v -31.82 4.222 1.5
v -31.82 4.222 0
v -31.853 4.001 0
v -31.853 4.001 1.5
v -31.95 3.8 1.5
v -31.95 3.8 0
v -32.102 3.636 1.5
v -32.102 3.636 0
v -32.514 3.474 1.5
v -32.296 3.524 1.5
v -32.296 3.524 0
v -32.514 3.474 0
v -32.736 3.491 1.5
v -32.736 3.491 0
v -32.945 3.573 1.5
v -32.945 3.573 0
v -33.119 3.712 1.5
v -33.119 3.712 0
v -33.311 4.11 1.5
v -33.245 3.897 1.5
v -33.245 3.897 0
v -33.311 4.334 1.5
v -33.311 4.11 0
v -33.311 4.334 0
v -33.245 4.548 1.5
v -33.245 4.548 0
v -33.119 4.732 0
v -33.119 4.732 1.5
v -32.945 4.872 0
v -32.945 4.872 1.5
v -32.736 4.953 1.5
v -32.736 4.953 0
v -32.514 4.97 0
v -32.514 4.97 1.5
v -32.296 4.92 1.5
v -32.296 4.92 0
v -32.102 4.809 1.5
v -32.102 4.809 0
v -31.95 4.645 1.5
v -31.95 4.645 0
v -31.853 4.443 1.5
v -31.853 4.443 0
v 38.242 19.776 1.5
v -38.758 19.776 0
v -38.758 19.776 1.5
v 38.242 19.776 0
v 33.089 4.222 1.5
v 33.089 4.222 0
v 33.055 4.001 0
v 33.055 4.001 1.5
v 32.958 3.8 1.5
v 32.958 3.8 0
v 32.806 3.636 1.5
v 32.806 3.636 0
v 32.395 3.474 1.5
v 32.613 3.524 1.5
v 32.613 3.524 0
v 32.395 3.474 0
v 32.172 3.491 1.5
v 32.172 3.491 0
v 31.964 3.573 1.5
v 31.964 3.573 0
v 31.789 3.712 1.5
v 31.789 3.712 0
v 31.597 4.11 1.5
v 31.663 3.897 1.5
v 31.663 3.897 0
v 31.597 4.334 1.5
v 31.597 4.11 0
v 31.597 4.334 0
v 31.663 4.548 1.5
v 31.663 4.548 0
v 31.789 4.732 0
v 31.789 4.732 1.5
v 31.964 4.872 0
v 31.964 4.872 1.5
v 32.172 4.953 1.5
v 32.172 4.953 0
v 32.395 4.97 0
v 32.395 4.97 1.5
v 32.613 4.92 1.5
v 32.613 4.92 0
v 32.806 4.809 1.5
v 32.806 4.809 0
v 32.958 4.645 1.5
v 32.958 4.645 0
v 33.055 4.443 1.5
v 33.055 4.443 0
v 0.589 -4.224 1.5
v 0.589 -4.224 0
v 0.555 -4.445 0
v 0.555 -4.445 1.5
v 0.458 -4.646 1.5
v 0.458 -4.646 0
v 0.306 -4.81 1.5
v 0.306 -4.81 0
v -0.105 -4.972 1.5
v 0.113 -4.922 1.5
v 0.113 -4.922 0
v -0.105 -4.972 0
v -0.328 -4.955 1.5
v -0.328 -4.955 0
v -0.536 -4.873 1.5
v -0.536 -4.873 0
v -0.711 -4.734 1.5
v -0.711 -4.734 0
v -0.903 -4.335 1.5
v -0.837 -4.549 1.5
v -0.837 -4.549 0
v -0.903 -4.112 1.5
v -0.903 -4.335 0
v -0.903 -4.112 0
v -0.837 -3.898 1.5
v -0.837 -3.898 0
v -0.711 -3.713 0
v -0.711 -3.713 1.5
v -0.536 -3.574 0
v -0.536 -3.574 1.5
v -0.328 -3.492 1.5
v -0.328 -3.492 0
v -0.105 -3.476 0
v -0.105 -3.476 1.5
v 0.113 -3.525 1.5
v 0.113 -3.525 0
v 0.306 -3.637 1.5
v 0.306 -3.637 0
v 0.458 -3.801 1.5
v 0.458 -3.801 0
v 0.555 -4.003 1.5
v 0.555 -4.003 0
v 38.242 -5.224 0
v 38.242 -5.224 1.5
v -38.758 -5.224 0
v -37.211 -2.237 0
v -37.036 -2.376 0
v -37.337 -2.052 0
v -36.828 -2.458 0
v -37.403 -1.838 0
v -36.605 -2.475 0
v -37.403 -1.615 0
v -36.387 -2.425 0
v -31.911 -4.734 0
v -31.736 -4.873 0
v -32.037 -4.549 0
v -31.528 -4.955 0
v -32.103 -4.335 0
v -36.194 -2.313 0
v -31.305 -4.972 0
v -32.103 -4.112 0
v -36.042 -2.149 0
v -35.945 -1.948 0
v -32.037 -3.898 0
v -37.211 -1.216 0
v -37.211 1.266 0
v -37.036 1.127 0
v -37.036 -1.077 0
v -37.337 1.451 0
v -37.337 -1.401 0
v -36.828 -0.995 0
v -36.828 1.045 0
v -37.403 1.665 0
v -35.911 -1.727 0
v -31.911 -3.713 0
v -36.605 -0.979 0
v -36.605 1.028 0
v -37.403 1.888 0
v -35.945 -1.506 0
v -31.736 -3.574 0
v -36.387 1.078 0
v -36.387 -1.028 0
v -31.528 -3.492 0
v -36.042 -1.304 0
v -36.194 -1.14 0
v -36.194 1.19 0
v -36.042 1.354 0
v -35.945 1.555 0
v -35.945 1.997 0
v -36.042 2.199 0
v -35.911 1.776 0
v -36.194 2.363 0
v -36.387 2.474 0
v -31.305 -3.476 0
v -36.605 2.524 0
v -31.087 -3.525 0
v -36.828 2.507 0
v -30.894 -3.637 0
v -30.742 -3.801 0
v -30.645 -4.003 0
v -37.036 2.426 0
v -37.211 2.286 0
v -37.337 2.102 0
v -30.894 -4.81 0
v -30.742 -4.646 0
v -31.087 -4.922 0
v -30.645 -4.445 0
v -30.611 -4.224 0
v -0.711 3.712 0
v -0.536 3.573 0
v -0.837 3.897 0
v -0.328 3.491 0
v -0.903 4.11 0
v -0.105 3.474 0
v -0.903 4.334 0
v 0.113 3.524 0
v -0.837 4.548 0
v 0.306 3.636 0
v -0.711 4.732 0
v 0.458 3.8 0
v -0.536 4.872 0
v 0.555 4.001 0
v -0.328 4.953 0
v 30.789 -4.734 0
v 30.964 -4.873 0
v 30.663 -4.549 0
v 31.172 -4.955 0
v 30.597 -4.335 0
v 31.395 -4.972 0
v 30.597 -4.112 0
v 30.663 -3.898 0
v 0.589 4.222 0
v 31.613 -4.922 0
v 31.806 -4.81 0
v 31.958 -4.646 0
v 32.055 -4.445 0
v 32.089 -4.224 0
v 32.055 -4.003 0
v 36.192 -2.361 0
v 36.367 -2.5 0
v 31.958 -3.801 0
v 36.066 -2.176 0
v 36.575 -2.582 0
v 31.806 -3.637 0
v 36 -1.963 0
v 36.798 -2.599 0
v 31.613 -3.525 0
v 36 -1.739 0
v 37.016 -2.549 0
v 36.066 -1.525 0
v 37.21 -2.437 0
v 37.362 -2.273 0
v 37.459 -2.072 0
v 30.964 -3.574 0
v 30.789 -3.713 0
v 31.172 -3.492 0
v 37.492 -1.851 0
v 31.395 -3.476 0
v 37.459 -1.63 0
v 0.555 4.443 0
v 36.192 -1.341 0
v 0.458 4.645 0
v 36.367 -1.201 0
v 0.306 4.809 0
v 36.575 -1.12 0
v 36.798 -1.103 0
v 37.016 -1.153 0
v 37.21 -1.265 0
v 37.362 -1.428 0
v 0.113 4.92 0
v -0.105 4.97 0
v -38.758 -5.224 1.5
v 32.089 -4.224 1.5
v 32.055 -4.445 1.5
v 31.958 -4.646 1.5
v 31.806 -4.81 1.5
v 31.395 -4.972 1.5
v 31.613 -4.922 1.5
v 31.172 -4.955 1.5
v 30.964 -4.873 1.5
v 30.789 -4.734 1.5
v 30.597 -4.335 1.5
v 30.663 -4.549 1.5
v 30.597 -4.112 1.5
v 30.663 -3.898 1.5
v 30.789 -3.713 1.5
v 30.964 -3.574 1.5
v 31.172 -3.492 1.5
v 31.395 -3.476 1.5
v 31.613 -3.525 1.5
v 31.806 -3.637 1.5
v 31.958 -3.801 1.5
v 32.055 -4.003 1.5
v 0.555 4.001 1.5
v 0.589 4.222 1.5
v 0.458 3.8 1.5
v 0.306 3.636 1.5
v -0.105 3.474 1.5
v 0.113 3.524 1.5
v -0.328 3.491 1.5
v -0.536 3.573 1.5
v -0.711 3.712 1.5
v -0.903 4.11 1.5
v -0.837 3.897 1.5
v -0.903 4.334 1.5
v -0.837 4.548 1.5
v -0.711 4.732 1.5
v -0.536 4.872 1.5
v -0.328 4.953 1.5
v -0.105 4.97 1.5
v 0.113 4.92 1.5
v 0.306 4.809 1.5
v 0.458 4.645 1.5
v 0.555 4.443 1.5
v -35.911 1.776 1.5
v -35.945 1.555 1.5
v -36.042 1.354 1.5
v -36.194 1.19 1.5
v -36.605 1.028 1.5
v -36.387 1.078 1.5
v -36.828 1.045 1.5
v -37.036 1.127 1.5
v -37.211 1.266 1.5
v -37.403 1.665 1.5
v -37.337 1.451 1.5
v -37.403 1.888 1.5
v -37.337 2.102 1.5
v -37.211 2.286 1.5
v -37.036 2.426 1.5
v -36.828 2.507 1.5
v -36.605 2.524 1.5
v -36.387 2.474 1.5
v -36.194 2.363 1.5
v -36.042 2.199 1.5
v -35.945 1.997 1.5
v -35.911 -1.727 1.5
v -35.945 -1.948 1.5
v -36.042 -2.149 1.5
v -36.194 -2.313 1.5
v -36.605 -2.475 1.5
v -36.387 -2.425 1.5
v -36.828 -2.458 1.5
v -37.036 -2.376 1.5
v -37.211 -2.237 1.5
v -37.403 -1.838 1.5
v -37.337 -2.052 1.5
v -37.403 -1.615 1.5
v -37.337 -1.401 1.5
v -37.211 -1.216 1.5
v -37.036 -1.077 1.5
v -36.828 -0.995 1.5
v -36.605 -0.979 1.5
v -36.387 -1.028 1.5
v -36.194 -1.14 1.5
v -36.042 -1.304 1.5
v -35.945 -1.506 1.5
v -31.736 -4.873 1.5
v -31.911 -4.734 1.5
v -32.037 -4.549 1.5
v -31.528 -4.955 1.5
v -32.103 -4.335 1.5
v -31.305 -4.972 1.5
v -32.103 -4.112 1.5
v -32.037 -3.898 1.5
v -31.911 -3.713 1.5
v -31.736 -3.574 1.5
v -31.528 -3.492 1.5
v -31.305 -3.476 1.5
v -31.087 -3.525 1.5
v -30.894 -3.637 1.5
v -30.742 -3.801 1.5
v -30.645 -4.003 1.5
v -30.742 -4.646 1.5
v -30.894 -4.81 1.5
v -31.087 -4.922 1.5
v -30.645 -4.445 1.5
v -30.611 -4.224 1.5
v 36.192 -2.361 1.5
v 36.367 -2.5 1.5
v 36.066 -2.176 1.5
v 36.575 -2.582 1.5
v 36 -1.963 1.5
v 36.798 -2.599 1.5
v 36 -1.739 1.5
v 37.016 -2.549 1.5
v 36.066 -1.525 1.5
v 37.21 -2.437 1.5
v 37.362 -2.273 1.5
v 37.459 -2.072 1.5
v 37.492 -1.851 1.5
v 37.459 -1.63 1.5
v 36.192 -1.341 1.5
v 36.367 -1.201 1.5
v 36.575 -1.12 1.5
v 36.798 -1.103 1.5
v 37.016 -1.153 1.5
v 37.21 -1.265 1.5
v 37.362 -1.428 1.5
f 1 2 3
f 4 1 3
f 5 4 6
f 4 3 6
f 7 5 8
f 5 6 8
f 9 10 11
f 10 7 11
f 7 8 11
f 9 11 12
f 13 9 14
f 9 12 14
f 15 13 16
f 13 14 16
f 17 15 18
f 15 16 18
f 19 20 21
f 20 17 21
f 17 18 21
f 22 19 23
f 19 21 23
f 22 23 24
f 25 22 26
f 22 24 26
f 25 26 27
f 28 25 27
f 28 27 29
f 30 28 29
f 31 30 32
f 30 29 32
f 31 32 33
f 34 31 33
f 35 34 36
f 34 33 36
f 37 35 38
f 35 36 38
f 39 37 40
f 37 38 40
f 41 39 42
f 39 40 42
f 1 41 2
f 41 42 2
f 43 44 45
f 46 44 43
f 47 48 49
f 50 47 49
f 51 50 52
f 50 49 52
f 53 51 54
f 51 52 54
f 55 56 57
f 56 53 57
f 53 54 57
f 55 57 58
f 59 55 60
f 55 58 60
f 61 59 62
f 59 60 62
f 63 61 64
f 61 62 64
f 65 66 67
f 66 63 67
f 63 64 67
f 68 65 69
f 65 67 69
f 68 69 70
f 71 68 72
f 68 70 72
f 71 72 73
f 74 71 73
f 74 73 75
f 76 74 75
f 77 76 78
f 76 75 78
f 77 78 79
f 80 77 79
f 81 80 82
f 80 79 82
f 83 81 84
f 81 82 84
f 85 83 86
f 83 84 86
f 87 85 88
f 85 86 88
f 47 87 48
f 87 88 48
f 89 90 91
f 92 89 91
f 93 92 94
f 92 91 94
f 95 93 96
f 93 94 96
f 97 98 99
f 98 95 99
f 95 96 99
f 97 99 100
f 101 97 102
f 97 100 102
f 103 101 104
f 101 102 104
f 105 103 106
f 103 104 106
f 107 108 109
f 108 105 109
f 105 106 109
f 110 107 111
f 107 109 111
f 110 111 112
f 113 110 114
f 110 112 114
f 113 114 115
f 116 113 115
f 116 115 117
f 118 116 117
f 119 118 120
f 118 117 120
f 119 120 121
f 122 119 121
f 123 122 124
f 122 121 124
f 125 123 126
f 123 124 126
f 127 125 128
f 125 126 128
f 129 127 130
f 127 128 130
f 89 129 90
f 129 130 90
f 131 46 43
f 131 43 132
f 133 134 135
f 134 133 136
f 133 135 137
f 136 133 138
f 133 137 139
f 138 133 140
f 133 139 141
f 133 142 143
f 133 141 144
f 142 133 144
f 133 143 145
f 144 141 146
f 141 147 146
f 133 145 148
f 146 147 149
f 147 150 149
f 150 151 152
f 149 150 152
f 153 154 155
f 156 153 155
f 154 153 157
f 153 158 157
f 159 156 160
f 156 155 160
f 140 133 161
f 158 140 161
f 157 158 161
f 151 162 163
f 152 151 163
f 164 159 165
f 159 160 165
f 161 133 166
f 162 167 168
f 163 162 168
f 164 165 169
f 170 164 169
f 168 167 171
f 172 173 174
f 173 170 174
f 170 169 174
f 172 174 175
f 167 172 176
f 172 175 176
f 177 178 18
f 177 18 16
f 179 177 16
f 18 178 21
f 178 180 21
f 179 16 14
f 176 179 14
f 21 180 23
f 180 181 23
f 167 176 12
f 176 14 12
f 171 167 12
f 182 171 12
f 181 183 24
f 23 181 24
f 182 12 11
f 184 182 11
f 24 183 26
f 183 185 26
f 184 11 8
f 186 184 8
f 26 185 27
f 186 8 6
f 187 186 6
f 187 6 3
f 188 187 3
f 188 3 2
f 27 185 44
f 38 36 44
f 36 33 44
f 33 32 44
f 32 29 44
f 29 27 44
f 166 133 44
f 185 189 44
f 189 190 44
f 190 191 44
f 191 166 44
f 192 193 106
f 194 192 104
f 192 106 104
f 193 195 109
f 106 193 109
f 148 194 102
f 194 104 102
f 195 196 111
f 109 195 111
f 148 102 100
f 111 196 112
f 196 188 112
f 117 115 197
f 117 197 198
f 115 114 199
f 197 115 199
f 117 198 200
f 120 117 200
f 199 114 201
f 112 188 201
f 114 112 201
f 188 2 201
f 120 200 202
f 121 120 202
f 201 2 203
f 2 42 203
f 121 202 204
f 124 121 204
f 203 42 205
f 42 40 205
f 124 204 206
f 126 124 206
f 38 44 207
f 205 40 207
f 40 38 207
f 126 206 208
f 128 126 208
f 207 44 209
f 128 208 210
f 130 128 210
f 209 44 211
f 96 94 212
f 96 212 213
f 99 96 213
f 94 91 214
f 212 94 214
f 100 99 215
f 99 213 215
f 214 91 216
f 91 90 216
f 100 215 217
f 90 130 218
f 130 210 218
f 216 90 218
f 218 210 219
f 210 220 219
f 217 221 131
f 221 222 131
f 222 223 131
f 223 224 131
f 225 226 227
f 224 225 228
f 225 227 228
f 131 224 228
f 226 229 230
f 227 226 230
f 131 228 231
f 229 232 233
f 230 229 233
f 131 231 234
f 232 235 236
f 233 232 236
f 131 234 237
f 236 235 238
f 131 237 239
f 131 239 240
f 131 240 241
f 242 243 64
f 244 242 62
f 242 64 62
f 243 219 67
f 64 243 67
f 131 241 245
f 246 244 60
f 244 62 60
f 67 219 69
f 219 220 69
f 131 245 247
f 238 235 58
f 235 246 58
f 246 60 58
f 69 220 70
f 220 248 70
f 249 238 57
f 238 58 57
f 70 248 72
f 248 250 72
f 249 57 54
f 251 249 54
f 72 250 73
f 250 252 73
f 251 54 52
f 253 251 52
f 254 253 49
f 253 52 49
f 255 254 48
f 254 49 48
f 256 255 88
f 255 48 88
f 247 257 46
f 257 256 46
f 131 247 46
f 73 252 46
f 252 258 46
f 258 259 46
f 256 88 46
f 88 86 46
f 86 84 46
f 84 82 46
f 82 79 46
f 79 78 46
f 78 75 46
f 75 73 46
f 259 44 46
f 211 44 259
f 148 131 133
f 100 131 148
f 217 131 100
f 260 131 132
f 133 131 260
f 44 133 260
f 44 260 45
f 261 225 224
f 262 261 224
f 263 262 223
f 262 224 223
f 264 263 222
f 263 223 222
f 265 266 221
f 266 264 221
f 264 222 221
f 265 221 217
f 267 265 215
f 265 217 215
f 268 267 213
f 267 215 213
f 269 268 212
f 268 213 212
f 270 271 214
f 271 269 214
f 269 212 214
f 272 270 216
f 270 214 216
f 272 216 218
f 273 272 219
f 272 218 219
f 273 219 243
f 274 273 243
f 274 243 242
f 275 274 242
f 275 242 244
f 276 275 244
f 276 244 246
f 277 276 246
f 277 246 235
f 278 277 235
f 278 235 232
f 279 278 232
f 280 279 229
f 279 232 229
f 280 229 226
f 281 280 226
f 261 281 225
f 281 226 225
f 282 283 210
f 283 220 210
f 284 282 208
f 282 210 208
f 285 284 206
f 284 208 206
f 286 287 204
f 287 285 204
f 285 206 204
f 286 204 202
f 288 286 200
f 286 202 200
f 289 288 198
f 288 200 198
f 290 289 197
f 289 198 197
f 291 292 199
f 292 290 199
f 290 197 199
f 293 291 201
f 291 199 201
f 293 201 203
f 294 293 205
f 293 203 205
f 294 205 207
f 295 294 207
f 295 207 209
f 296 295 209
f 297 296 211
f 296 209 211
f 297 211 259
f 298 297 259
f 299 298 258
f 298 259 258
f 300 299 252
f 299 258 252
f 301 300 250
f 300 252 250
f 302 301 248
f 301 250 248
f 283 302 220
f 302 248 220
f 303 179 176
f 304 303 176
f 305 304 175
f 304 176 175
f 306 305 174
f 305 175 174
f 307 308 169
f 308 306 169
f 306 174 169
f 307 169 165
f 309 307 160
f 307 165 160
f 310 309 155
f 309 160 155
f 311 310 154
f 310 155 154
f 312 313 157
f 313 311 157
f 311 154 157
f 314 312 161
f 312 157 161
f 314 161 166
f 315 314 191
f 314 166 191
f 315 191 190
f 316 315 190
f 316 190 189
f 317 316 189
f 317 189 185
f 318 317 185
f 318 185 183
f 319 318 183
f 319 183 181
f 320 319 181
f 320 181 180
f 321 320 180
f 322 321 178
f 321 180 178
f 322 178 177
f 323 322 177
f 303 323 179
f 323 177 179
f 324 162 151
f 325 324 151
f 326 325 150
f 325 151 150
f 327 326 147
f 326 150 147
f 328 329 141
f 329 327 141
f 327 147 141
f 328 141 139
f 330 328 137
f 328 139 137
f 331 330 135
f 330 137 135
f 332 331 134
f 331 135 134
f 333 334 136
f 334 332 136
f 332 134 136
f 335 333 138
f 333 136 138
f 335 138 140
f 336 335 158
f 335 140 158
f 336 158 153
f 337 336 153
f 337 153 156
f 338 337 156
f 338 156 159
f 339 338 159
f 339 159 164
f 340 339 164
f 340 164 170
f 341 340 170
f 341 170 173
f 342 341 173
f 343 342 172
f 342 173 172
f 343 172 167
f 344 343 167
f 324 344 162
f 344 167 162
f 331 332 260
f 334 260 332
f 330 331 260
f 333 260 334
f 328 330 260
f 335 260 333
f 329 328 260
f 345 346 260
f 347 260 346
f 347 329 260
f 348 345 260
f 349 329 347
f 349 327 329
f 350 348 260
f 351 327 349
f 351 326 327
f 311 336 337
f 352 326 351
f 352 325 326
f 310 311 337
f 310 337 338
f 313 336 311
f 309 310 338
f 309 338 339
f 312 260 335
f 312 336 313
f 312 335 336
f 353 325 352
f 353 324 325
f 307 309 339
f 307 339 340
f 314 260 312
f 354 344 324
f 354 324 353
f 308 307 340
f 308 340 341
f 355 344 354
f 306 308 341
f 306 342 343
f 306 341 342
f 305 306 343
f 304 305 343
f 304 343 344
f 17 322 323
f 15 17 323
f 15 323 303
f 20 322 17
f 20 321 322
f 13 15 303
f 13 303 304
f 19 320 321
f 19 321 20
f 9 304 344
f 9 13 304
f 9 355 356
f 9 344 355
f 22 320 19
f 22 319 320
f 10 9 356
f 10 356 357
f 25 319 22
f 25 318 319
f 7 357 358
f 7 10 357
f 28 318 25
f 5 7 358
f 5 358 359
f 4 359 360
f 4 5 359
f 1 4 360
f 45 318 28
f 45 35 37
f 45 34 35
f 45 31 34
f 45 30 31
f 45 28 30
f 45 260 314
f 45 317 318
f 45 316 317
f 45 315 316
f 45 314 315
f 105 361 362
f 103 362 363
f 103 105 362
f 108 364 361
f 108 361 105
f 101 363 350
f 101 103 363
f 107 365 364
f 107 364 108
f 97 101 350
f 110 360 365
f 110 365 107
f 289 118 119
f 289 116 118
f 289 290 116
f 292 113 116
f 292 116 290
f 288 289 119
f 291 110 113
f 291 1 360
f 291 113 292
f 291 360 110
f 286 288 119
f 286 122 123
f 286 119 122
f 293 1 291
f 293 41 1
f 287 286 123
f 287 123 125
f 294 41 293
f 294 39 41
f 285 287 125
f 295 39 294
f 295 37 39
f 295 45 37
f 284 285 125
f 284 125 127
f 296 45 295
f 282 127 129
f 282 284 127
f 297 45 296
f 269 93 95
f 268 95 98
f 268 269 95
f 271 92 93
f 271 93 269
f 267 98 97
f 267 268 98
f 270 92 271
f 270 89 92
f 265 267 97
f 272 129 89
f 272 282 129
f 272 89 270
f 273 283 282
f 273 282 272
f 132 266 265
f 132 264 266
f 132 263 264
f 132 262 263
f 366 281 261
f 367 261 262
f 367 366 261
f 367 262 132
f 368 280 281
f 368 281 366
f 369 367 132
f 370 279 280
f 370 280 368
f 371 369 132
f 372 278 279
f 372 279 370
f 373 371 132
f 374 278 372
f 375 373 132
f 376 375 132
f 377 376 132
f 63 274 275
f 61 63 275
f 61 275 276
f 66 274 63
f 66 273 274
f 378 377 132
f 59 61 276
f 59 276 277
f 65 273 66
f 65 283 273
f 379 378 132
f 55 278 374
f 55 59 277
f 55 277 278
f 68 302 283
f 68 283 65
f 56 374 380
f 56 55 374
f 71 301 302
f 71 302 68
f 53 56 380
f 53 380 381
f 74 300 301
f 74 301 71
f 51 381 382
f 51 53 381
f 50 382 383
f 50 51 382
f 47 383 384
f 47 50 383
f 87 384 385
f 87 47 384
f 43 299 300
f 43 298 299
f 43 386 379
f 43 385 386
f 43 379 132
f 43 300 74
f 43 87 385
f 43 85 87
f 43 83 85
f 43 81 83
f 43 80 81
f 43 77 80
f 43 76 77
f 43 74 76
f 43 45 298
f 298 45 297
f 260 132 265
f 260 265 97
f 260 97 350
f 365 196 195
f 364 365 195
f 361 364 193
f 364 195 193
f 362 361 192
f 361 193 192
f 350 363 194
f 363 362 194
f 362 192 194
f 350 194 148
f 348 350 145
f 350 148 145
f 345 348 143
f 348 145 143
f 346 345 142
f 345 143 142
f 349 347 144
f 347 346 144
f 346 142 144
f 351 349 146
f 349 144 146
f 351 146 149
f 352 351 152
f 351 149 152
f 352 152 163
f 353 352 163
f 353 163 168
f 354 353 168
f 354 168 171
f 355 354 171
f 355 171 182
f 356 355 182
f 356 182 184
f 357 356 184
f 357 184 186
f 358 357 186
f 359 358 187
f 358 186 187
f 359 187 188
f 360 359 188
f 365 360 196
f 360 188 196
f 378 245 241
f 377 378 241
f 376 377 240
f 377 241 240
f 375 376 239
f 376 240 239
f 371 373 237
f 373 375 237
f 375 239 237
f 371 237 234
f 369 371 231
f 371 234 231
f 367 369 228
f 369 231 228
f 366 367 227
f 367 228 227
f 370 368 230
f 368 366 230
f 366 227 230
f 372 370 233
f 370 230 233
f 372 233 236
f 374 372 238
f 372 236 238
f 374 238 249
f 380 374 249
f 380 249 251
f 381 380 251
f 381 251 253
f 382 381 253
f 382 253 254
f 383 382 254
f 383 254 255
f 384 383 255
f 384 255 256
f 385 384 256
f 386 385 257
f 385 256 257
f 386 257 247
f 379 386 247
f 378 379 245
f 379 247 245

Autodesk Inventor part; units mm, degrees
ref_plane "YZ Plane" through (0, 0, 0) normal (1, 0, 0) x (0, 1, 0)
ref_plane "XZ Plane" through (0, 0, 0) normal (0, 1, 0) x (-1, 0, 0)
ref_plane "XY Plane" through (0, 0, 0) normal (0, 0, 1) x (1, 0, 0)
ref_plane "Arbeitsebene1" through (0, -3.9, 0.8) normal (0, -1, 0) x (-1, 0, 0)
ref_plane "Arbeitsebene2" through (0, 0, 0) normal (0, 0, 1) x (1, 0, 0)
sketch "Skizze2" plane through (0, 0, 0) normal (0, 0, 1) x (1, 0, 0)
  circle A0 centre (31.3386, -4.2236) radius 0.75
  circle A1 centre (-0.1614, -4.2236) radius 0.75
  circle A2 centre (-31.3614, -4.2236) radius 0.75
  circle A3 centre (-32.5696, 4.2222) radius 0.75
  circle A4 centre (-0.1614, 4.2222) radius 0.75
  circle A5 centre (32.3386, 4.2222) radius 0.75
  circle A6 centre (36.7419, -1.8509) radius 0.75
  circle A7 centre (-36.6614, -1.7266) radius 0.75
  circle A8 centre (-36.6614, 1.7763) radius 0.75
  line L0 (33.8386, 4.2222) -> (-46.1614, 4.2222) construction
  line L1 (-46.1614, 4.2222) -> (-46.1614, -4.2236) construction
  line L2 (-46.1614, -4.2236) -> (33.8386, -4.2236) construction
  line L3 (33.8386, -4.2236) -> (33.8386, 4.2222) construction
  line L4 (33.8386, -4.2236) -> (36.7419, -4.2236) construction
  line L5 (36.7419, -4.2236) -> (36.7419, 4.2222) construction
  line L6 (36.7419, 4.2222) -> (33.8386, 4.2222) construction
  line L7 (33.8386, 4.2222) -> (33.8386, -4.2236) construction
  line L8 (-46.1614, -4.2236) -> (-36.6614, -4.2236) construction
  line L9 (-36.6614, -4.2236) -> (-36.6614, 4.2222) construction
  line L10 (-36.6614, 4.2222) -> (-46.1614, 4.2222) construction
  line L11 (-46.1614, 4.2222) -> (-46.1614, -4.2236) construction
  line L12 (38.2419, -5.2236) -> (-38.7581, -5.2236)
  line L13 (-38.7581, -5.2236) -> (-38.7581, 19.7764)
  line L14 (-38.7581, 19.7764) -> (38.2419, 19.7764)
  line L15 (38.2419, 19.7764) -> (38.2419, -5.2236)
  point P0 (0, 0)
  dimension "d0" = 1.5
  dimension "d1" = 8.4458
  dimension "d2" = 80
  dimension "d3" = 33.8386
  dimension "d4" = 4.2222
  dimension "d5" = 2.5
  dimension "d6" = 1.5
  dimension "d7" = 13.5918
  dimension "d8" = 14.8
  dimension "d9" = 34
  dimension "d10" = 34
  dimension "d11" = 2.9033
  dimension "d12" = 2.3726
  dimension "d13" = 9.5
  dimension "d14" = 2.497
  dimension "d15" = 2.4459
  dimension "d16" = 25
  dimension "d17" = 77
  dimension "d18" = 1.5
  dimension "d19" = 1
extrude "Extrusion1" add sketch "Skizze2" along normal blind 1.5
properties part number "Poti_Sensor_PCB_"
